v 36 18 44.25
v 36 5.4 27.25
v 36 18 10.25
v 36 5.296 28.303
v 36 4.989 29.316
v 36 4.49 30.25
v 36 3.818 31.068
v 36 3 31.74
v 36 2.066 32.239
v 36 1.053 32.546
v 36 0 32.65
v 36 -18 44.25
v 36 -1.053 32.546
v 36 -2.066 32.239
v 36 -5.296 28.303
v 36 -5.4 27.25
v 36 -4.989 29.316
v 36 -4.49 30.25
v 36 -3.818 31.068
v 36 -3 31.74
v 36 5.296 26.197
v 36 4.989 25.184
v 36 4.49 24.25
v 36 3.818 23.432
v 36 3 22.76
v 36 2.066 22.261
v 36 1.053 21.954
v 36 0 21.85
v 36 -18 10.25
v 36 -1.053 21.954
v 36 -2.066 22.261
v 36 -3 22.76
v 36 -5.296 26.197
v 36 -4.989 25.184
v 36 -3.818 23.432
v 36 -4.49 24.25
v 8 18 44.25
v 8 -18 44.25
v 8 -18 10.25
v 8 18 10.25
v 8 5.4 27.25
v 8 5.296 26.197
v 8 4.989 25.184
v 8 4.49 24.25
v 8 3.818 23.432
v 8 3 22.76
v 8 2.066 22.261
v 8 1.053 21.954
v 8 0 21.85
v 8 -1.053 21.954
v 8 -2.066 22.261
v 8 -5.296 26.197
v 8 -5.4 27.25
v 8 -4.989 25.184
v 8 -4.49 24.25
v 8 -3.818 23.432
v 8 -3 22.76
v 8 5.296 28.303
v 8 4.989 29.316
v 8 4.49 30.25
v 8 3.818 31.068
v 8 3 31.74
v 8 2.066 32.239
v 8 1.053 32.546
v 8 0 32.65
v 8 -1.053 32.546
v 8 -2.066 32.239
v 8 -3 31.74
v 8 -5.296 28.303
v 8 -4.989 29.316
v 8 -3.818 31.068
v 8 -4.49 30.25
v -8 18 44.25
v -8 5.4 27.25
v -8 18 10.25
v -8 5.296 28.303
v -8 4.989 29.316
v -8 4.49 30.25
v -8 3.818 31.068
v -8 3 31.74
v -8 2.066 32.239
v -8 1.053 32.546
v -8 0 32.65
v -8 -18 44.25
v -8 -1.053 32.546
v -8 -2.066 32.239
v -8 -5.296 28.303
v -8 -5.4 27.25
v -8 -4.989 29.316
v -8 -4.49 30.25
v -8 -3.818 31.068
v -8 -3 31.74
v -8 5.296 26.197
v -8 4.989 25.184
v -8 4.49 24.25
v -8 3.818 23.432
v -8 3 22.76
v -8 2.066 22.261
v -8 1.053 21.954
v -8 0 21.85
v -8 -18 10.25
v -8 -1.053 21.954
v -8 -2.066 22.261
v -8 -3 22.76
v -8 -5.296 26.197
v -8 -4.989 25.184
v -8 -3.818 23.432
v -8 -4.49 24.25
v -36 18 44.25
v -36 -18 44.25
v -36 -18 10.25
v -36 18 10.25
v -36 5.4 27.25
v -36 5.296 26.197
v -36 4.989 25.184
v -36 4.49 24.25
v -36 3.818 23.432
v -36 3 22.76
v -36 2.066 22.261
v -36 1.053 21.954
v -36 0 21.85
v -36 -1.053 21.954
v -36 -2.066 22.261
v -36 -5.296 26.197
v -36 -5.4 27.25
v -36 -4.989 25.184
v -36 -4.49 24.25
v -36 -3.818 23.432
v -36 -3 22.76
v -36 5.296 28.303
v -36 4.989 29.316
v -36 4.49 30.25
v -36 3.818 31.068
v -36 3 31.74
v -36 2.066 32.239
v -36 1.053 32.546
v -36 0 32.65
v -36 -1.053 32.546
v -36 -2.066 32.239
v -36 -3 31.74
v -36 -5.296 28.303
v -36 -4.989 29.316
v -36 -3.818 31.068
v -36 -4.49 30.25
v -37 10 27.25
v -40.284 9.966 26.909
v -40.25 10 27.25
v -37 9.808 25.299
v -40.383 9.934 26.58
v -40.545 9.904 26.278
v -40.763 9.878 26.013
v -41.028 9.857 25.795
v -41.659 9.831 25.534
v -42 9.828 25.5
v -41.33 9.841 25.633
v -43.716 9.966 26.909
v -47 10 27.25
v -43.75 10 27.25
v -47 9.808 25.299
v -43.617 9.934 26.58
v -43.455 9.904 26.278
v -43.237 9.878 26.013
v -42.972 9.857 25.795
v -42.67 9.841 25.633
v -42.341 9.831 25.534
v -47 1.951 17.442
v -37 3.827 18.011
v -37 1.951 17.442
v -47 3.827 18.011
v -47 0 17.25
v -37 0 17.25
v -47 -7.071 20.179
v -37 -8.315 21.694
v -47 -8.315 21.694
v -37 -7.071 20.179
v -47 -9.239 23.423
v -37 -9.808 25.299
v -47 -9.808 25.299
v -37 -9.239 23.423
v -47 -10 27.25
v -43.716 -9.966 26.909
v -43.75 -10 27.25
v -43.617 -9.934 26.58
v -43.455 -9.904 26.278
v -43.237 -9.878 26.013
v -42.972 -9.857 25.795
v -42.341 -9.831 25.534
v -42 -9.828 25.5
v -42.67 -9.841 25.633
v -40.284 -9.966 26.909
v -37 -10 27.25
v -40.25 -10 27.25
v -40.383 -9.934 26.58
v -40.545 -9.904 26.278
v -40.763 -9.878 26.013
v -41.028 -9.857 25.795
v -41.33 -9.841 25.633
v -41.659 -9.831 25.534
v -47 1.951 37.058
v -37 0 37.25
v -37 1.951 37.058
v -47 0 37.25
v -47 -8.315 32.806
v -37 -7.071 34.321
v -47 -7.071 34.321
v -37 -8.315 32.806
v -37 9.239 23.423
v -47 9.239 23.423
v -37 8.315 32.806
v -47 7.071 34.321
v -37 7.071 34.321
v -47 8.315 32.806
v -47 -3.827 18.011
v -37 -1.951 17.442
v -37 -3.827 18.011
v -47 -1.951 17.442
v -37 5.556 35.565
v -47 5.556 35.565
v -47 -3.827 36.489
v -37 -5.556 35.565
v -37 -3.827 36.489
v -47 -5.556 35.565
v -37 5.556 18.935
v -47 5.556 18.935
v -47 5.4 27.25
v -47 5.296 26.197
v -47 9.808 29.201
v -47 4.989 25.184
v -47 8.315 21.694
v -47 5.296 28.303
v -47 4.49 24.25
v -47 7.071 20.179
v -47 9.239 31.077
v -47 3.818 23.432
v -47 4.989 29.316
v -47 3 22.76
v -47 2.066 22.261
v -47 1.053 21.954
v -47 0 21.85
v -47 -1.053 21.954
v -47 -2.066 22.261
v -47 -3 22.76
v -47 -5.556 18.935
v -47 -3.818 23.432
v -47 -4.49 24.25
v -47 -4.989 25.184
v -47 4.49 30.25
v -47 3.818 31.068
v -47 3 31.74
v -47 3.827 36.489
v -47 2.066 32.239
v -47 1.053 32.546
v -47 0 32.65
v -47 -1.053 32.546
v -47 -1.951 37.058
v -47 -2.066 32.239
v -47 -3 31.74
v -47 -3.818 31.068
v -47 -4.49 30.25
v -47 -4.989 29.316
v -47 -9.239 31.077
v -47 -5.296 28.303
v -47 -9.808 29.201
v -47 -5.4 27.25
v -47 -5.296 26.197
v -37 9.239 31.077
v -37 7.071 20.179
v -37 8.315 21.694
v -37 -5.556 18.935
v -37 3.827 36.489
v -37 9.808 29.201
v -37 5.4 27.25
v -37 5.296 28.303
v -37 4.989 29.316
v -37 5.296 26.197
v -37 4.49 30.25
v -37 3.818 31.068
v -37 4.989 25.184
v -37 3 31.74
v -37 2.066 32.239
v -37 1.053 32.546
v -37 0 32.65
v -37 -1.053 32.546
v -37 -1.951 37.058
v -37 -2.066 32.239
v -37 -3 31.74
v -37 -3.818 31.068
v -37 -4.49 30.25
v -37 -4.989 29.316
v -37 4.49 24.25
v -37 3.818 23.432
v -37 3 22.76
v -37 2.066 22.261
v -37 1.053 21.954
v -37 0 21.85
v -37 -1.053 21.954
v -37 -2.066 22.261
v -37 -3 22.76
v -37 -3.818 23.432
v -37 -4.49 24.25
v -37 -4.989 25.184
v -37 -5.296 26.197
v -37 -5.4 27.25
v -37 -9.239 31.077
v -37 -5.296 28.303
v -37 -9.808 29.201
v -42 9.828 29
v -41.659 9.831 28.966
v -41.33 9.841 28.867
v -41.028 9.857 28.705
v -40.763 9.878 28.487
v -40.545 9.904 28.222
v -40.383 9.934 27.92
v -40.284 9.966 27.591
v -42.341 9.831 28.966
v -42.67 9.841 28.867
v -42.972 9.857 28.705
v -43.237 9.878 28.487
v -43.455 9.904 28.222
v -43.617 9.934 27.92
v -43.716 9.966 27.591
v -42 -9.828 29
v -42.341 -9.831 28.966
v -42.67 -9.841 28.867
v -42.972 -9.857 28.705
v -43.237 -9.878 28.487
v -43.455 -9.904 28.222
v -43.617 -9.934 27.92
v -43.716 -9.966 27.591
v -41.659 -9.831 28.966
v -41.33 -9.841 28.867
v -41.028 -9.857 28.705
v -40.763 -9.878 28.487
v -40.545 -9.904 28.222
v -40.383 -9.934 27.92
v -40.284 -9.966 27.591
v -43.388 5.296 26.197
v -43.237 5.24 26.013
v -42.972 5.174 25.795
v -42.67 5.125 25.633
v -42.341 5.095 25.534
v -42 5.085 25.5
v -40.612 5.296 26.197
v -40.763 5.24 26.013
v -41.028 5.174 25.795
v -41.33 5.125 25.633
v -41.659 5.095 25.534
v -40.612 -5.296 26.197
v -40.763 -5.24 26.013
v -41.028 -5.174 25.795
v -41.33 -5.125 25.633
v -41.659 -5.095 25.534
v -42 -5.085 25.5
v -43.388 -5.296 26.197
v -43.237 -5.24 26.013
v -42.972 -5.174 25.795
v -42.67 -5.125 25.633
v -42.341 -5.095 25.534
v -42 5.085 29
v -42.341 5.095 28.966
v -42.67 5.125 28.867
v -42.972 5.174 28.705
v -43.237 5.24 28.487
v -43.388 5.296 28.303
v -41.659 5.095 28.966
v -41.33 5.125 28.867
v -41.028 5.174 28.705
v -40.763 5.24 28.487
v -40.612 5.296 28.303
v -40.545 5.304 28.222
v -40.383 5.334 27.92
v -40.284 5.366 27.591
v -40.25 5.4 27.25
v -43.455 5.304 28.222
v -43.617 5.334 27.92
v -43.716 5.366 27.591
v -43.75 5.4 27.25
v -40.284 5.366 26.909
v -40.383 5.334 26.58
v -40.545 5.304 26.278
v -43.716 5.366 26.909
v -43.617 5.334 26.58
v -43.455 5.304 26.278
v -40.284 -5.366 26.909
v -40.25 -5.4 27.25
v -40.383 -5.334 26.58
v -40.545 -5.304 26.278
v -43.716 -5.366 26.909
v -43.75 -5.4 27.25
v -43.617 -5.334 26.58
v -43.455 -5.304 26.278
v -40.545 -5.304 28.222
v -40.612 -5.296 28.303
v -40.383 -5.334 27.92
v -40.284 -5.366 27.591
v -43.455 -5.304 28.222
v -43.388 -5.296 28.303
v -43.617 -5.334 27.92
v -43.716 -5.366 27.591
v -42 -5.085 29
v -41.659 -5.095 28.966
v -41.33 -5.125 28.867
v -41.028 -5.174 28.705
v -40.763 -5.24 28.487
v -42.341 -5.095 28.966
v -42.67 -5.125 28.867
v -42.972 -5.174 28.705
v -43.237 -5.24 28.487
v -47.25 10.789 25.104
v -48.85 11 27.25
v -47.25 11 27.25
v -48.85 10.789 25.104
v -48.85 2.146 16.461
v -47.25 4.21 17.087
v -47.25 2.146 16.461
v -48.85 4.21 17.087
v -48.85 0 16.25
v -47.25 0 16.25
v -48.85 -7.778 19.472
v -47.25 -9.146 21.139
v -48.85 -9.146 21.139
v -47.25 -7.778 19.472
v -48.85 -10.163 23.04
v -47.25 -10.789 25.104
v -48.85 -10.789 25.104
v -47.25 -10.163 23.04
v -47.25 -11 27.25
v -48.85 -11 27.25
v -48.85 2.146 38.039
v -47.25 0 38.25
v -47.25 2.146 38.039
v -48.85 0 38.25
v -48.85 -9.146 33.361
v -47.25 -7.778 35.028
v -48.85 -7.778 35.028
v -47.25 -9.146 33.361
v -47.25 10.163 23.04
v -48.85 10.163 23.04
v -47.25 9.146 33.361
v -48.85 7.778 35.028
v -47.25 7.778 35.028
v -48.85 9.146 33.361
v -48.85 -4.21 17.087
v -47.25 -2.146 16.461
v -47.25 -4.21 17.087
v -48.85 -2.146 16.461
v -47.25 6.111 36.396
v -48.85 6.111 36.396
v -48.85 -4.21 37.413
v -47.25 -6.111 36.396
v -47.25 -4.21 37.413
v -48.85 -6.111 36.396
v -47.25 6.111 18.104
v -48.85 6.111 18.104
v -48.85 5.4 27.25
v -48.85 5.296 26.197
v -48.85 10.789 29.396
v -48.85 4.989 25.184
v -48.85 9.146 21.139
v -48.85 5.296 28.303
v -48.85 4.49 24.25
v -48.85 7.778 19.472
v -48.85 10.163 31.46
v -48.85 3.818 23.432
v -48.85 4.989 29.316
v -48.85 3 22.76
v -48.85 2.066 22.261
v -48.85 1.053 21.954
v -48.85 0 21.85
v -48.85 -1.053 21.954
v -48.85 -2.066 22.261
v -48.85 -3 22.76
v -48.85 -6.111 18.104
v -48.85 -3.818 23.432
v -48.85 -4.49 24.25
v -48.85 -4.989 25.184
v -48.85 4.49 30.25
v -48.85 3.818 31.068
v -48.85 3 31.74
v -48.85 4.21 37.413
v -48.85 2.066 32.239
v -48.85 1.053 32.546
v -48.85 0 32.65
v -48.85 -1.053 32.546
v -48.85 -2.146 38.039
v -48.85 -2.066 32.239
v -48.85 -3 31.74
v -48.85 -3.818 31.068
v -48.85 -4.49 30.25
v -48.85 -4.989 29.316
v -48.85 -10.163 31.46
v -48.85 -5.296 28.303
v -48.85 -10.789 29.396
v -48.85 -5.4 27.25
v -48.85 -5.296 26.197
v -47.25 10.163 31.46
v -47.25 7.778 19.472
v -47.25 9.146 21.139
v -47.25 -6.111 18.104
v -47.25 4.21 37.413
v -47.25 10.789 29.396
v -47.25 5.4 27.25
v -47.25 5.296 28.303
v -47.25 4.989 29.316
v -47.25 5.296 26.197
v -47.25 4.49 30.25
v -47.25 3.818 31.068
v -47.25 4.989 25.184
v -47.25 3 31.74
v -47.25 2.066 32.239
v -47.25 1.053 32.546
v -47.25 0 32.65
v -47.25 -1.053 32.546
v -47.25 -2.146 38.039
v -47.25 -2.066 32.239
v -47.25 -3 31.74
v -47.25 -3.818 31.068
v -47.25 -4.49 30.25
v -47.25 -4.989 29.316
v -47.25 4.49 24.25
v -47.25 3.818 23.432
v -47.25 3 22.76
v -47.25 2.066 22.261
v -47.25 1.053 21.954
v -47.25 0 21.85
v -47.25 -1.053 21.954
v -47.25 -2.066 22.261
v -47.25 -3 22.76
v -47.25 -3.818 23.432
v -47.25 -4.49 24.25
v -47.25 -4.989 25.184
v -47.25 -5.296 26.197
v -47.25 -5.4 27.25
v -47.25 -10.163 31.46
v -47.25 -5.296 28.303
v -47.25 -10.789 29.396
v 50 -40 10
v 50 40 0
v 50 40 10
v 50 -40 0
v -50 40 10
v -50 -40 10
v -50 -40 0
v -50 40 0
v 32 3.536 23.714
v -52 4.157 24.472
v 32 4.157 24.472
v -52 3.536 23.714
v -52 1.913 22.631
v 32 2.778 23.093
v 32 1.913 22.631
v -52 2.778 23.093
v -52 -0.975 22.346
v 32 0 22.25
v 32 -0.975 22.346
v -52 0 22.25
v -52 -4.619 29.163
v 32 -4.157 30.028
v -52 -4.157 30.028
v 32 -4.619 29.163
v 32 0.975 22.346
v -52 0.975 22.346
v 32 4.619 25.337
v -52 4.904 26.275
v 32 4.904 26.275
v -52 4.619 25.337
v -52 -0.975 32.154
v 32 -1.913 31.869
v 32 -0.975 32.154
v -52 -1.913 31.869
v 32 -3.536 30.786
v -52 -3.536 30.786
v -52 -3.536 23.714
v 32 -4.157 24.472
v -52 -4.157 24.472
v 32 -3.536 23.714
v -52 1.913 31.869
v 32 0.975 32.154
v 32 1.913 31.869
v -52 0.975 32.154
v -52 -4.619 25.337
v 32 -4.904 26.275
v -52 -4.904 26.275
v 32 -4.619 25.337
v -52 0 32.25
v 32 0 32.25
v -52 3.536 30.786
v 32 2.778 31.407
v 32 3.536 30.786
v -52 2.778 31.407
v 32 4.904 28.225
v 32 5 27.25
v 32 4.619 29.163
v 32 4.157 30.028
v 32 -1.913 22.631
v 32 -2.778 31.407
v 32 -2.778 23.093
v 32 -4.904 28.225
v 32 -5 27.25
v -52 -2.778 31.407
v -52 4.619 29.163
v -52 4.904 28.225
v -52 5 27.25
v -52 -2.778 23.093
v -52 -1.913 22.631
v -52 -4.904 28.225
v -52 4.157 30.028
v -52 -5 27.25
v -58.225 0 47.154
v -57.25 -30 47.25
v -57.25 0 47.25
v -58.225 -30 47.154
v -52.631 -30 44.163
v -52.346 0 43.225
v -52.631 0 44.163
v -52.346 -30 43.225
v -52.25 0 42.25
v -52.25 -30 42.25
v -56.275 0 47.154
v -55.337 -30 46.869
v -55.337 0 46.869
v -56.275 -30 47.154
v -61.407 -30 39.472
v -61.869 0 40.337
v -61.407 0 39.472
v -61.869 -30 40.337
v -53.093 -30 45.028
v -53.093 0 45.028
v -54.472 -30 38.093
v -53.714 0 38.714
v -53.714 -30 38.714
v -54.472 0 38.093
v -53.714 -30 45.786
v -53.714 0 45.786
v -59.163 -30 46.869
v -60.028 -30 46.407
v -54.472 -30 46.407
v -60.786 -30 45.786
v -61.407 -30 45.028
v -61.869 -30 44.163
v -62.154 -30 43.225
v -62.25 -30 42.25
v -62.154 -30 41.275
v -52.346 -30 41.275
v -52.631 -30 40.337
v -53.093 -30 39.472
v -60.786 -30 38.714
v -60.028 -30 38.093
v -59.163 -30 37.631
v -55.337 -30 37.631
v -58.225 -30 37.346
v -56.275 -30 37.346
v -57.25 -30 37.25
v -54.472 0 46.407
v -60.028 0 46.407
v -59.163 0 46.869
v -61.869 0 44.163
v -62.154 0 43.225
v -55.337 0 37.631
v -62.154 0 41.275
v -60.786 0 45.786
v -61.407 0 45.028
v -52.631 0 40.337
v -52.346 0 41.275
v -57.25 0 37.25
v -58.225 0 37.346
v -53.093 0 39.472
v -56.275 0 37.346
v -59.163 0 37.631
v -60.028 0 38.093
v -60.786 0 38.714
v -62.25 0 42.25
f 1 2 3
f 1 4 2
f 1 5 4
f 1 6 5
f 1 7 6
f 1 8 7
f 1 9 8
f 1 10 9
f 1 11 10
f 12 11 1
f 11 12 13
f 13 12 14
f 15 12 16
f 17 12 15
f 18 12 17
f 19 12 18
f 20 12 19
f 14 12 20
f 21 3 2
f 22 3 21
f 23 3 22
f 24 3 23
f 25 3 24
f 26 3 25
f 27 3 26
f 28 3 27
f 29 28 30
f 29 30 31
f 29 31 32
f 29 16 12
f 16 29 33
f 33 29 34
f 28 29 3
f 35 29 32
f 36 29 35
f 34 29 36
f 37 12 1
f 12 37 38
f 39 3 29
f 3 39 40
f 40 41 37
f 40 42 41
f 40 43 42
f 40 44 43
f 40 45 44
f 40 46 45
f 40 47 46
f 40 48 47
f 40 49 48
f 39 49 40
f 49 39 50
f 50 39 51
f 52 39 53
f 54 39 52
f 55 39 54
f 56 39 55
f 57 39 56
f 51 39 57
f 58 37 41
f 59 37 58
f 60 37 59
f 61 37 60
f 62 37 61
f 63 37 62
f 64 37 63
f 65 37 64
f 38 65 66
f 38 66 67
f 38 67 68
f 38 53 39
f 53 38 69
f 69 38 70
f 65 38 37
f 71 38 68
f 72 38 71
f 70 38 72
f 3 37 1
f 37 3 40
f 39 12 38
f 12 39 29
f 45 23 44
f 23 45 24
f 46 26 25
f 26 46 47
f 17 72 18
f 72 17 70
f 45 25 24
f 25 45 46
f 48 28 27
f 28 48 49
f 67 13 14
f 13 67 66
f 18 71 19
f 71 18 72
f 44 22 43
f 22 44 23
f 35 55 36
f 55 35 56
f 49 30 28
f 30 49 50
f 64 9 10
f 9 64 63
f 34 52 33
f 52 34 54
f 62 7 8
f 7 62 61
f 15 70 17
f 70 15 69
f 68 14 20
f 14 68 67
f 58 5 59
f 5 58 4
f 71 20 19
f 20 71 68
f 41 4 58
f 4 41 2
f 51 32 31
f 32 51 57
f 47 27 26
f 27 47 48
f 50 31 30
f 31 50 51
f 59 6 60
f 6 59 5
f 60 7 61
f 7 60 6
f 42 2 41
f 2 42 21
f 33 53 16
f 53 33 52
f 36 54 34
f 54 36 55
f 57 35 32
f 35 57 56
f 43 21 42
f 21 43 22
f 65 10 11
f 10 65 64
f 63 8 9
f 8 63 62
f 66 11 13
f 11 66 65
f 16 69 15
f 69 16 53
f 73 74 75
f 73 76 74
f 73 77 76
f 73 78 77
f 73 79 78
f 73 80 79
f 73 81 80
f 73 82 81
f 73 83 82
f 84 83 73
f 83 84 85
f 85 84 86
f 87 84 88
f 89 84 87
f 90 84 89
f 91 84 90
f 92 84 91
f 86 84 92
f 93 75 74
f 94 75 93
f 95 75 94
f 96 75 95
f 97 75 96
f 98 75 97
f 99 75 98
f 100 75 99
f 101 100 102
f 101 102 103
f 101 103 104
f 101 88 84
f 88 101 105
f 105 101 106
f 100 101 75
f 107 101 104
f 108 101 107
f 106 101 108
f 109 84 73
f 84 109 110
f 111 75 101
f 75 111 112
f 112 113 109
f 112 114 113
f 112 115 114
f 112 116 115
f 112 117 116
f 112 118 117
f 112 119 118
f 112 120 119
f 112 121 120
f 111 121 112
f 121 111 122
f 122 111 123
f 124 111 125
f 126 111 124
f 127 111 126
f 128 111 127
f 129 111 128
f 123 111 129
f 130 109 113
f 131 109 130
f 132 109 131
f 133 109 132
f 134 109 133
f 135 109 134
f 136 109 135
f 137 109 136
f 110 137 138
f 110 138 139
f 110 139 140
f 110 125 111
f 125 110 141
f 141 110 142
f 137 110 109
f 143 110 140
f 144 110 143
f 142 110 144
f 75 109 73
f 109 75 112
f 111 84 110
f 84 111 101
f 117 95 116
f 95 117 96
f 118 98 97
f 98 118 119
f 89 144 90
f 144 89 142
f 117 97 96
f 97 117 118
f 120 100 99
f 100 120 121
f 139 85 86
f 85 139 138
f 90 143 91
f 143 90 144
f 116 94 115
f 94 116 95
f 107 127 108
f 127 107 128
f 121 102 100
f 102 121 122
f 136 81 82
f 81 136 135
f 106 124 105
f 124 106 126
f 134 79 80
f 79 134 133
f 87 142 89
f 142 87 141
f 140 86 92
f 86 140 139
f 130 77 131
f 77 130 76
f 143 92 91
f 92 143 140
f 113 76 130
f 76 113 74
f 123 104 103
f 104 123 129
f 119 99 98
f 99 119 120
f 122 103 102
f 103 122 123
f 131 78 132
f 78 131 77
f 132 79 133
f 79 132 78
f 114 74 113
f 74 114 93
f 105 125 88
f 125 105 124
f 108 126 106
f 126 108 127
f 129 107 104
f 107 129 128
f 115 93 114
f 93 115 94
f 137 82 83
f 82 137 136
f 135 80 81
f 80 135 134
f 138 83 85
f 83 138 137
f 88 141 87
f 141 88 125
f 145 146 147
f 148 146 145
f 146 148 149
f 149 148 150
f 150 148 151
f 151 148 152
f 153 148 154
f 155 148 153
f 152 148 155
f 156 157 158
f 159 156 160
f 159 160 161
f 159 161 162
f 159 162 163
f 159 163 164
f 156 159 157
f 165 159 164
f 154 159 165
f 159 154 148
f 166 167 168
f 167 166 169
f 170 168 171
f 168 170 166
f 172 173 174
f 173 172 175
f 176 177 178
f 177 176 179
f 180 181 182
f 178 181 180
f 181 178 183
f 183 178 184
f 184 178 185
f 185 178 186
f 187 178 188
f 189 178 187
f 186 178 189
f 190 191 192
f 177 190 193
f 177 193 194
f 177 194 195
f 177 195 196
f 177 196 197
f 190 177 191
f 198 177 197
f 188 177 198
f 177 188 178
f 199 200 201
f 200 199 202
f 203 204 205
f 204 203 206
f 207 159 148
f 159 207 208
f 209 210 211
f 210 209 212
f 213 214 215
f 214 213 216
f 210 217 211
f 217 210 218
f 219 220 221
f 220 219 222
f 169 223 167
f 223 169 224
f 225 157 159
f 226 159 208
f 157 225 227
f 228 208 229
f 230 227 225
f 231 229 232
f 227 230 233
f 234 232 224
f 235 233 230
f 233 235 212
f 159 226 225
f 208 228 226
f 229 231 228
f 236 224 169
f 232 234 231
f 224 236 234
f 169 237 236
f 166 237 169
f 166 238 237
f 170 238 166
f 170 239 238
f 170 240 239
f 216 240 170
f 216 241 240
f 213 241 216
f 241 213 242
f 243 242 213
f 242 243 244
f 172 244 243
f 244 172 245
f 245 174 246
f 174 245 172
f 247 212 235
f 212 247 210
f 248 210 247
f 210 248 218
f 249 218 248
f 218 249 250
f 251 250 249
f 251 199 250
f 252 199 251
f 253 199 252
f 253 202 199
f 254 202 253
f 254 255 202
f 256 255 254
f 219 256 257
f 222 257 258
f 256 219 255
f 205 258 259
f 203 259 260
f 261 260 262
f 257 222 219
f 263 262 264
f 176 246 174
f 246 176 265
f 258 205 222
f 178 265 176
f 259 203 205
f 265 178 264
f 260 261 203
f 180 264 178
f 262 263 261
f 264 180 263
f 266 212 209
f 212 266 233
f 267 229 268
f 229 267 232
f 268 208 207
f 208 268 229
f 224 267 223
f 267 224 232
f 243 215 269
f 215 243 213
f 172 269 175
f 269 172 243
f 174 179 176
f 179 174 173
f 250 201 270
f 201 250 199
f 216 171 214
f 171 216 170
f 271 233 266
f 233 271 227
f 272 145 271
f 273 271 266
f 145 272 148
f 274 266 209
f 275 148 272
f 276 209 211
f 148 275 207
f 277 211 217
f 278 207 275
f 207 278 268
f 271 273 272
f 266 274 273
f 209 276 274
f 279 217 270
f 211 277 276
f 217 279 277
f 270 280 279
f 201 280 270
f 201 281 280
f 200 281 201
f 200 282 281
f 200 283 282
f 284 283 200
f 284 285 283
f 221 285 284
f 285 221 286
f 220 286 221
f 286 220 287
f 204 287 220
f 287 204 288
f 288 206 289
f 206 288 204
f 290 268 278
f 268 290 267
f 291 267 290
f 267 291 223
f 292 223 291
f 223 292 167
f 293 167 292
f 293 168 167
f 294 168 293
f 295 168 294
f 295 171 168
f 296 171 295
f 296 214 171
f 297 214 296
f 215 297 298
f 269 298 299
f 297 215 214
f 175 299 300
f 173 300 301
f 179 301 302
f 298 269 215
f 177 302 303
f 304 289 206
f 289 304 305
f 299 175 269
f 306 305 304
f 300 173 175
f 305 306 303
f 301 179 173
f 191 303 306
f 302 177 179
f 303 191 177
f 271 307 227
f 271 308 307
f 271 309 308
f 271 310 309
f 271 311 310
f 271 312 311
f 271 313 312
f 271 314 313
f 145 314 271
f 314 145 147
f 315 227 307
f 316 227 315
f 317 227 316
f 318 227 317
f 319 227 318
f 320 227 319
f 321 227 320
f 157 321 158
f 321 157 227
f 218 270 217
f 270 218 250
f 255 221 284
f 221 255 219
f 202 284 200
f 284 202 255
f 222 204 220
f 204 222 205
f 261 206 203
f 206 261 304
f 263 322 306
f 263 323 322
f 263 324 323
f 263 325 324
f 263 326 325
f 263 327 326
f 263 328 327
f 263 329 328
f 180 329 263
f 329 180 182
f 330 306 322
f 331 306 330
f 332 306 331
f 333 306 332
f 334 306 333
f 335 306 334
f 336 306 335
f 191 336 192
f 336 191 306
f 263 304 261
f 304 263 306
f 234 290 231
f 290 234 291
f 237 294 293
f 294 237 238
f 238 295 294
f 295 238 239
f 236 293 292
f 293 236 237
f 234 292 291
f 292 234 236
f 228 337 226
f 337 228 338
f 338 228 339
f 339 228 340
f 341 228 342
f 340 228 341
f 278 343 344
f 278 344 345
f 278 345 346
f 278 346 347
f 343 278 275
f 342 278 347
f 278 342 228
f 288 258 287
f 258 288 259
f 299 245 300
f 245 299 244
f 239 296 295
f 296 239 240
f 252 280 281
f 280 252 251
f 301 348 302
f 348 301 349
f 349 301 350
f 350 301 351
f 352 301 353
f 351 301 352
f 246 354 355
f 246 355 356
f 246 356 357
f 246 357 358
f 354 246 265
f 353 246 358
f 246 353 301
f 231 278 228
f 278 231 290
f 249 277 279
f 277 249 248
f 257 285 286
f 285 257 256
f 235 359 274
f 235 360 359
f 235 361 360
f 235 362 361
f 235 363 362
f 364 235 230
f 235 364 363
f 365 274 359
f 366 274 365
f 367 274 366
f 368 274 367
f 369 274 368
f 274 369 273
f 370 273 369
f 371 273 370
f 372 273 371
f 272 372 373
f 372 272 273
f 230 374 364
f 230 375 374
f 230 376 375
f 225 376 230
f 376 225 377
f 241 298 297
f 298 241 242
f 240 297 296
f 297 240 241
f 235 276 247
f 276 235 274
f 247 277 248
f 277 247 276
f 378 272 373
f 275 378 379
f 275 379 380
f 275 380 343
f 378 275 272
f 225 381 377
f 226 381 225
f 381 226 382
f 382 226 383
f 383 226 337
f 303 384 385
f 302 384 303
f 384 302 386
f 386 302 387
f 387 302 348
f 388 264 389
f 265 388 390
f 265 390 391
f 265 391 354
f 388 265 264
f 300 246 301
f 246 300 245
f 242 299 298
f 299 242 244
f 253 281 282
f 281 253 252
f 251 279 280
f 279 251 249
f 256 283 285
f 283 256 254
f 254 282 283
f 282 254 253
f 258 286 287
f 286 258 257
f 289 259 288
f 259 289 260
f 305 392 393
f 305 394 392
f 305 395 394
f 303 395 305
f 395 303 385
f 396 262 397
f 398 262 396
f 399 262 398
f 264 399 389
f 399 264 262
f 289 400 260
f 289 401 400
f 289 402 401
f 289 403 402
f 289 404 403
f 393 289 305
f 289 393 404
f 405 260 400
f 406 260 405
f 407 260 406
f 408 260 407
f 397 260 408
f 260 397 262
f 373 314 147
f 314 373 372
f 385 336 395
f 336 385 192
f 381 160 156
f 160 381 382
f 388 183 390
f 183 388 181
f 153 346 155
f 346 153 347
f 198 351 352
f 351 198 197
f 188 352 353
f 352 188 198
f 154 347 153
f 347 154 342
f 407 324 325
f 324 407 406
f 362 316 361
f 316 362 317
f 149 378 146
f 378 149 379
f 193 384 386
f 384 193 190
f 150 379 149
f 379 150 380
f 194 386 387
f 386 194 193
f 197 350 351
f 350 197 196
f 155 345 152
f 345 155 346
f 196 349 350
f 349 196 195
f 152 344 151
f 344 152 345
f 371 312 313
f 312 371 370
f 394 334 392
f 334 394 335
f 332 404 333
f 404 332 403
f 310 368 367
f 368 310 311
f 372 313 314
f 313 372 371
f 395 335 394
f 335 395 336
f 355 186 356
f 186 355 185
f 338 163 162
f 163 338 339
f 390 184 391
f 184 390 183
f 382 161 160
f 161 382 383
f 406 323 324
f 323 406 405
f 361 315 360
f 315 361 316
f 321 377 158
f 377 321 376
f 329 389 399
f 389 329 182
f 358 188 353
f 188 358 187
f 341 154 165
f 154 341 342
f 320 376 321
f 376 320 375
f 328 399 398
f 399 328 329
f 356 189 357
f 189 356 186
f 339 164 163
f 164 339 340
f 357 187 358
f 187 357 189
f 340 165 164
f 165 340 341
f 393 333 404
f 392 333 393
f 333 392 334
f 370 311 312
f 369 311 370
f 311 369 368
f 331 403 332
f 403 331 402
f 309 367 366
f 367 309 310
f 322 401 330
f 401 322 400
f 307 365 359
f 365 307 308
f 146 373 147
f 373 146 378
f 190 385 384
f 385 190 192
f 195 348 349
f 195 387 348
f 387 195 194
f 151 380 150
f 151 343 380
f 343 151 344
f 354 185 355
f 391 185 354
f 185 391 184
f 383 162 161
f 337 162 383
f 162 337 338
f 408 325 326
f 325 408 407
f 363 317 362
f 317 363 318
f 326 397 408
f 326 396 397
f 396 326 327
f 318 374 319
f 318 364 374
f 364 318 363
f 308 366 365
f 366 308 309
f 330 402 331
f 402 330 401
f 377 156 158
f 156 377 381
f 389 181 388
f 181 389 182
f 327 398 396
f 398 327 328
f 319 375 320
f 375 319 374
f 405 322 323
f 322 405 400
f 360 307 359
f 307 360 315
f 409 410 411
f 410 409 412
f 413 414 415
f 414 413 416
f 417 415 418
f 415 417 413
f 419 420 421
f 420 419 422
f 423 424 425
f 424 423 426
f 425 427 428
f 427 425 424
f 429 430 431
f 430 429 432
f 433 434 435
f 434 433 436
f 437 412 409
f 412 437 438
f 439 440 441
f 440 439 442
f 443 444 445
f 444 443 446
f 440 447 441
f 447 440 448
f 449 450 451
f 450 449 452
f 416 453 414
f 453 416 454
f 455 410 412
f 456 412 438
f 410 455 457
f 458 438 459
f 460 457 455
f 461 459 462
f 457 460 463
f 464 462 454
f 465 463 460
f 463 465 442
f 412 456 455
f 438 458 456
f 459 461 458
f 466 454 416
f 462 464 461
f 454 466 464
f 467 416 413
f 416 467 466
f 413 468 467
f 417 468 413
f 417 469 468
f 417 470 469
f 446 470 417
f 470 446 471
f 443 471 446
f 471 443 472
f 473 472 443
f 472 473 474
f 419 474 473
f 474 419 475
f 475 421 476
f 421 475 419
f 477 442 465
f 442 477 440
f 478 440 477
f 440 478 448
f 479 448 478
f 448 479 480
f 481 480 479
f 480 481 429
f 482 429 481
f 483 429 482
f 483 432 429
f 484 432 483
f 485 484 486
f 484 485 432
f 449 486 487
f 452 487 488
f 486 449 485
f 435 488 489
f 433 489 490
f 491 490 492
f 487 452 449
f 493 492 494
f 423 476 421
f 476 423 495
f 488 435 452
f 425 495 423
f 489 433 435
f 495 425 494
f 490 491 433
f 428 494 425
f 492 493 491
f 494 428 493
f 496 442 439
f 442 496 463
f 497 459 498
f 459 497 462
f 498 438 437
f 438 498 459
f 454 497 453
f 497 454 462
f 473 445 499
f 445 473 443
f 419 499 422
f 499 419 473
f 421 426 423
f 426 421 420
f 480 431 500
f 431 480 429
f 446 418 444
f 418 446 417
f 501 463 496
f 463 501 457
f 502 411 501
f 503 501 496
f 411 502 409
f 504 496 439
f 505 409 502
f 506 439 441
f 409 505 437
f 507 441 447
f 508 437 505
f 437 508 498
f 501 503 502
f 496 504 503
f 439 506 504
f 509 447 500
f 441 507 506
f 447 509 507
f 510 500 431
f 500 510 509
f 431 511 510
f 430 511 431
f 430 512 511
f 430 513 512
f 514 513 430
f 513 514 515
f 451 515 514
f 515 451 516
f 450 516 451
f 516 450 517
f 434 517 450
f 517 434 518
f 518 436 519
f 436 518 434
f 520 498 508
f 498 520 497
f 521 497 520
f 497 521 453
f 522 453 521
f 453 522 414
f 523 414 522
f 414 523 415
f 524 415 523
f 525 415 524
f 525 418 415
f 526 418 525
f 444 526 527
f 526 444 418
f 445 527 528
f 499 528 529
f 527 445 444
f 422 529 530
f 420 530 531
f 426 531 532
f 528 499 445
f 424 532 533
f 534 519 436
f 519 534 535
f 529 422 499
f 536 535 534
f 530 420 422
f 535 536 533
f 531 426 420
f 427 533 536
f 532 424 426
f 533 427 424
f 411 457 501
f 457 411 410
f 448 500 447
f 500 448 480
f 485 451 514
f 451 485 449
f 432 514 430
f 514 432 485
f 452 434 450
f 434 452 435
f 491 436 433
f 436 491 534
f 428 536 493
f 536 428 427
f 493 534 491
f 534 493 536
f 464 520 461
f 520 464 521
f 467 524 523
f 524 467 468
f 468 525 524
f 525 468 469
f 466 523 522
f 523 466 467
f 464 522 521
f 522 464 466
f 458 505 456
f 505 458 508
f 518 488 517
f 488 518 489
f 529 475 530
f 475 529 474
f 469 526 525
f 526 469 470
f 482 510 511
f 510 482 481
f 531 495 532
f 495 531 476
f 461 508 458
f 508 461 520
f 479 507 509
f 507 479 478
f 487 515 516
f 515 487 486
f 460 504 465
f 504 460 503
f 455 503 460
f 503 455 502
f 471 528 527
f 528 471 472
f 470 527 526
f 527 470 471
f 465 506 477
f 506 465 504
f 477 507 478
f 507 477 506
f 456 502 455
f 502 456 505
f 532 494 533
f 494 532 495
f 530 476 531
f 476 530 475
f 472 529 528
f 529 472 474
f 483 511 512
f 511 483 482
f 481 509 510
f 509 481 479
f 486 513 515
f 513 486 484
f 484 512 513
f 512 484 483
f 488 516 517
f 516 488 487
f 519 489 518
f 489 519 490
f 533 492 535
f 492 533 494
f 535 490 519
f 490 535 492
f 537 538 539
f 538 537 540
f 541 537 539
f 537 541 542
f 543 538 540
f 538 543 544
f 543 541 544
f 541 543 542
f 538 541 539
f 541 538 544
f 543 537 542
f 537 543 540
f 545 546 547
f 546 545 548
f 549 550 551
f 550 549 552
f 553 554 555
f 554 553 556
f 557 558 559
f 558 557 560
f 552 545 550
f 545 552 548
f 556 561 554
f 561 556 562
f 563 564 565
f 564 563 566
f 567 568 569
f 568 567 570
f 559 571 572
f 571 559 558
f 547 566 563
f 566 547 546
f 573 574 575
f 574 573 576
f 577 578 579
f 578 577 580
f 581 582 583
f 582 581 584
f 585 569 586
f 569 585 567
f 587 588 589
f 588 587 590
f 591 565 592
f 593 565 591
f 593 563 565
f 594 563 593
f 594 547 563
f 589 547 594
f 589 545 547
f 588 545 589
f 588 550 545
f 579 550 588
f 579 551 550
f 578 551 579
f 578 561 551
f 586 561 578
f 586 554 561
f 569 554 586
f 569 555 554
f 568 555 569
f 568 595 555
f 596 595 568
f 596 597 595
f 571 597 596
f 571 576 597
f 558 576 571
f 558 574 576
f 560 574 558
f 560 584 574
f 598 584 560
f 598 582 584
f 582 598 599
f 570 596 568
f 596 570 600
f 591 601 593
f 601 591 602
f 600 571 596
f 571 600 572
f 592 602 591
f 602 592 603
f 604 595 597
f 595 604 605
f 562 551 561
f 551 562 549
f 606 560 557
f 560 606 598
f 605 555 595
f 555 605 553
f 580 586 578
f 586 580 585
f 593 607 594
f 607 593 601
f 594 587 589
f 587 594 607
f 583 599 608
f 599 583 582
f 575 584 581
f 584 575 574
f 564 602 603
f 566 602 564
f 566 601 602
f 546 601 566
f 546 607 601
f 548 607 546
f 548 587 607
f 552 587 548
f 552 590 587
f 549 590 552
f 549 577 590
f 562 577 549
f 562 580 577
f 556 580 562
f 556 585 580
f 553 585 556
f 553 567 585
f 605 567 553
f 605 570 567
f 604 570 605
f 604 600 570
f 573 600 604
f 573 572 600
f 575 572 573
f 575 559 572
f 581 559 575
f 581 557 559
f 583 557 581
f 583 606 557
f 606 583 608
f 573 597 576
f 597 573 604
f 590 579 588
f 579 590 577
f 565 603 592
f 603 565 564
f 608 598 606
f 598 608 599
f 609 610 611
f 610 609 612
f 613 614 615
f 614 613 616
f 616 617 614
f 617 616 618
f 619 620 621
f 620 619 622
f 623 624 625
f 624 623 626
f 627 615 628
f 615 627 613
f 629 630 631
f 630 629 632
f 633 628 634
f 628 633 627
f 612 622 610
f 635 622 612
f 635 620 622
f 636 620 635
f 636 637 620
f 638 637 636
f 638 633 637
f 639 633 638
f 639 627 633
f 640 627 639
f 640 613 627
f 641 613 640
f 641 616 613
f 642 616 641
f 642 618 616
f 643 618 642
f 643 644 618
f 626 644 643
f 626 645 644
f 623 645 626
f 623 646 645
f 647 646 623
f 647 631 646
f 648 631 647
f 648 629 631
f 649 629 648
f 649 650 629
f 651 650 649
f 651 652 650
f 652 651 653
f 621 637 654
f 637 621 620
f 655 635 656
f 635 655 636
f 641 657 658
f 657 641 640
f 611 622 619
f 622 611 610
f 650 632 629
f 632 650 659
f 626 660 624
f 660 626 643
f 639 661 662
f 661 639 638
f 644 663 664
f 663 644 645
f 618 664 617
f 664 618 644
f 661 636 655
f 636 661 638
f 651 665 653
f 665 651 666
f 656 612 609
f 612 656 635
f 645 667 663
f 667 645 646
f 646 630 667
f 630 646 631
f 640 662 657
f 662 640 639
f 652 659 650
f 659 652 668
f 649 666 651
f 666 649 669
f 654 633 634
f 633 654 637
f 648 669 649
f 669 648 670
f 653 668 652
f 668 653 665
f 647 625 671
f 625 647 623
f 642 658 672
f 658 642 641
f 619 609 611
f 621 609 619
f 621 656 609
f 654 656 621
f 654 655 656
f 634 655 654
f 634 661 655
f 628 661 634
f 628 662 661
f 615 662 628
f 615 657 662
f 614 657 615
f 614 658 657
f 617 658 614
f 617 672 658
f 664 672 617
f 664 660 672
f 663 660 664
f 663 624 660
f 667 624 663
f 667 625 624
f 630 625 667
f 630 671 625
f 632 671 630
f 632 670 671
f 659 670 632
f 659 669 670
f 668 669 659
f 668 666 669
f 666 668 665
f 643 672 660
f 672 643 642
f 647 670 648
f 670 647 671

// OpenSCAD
$fn = 32;

// ------------------------------------------------------------------------
// Machine vise: screw d10, jaws 28 x 34 mm
// Every part is its own module, assembly() places every instance.
// ------------------------------------------------------------------------

// --- part 1 ---
module vise_bed() {
  difference() {
    translate([-50, -40, 0]) cube([100, 80, 10]);
  }
}

// --- part 2 ---
module vise_jaw() {
  difference() {
    translate([-14, -18, 0]) cube([28, 36, 34]);
    translate([0, 0, 17]) rotate([0, 90, 0]) cylinder(h = 30, d = 10.8, center = true);
  }
}

// --- part 3 ---
module vise_screw() {
  translate([0, 0, -42]) cylinder(h = 84, d = 10);
}

// --- part 4 ---
module screw_collar() {
  difference() {
    cylinder(h = 10, d = 20);
    translate([0, 0, -1]) cylinder(h = 12, d = 10.8);
    translate([0, 0, 5]) rotate([90, 0, 0]) cylinder(h = 22, d = 3.5, center = true);
  }
}

// --- part 5 ---
module screw_washer() {
  difference() {
      translate([0, 0, 0]) cylinder(h = 1.6, d = 22);
      translate([0, 0, -1]) cylinder(h = 3.6, d = 10.8);
    }
}

// --- part 6 ---
module vise_handle() {
  cylinder(h = 30, d = 10);
}

// --- assembly ---
module assembly() {
  color([0.80, 0.24, 0.20]) translate([0, 0, 0]) rotate([0, 0, 0]) vise_bed();
  color([0.20, 0.45, 0.75]) translate([22, 0, 10.25]) rotate([0, 0, 0]) vise_jaw();
  color([0.25, 0.62, 0.32]) translate([-22, 0, 10.25]) rotate([0, 0, 0]) vise_jaw();
  color([0.92, 0.70, 0.18]) translate([-10, 0, 27.25]) rotate([0, 90, 0]) vise_screw();
  color([0.58, 0.35, 0.70]) translate([-47, 0, 27.25]) rotate([0, 90, 0]) screw_collar();
  color([0.16, 0.66, 0.66]) translate([-48.85, 0, 27.25]) rotate([0, 90, 0]) screw_washer();
  color([0.85, 0.48, 0.18]) translate([-57.25, 0, 42.25]) rotate([90, 0, 0]) vise_handle();
}

assembly();
